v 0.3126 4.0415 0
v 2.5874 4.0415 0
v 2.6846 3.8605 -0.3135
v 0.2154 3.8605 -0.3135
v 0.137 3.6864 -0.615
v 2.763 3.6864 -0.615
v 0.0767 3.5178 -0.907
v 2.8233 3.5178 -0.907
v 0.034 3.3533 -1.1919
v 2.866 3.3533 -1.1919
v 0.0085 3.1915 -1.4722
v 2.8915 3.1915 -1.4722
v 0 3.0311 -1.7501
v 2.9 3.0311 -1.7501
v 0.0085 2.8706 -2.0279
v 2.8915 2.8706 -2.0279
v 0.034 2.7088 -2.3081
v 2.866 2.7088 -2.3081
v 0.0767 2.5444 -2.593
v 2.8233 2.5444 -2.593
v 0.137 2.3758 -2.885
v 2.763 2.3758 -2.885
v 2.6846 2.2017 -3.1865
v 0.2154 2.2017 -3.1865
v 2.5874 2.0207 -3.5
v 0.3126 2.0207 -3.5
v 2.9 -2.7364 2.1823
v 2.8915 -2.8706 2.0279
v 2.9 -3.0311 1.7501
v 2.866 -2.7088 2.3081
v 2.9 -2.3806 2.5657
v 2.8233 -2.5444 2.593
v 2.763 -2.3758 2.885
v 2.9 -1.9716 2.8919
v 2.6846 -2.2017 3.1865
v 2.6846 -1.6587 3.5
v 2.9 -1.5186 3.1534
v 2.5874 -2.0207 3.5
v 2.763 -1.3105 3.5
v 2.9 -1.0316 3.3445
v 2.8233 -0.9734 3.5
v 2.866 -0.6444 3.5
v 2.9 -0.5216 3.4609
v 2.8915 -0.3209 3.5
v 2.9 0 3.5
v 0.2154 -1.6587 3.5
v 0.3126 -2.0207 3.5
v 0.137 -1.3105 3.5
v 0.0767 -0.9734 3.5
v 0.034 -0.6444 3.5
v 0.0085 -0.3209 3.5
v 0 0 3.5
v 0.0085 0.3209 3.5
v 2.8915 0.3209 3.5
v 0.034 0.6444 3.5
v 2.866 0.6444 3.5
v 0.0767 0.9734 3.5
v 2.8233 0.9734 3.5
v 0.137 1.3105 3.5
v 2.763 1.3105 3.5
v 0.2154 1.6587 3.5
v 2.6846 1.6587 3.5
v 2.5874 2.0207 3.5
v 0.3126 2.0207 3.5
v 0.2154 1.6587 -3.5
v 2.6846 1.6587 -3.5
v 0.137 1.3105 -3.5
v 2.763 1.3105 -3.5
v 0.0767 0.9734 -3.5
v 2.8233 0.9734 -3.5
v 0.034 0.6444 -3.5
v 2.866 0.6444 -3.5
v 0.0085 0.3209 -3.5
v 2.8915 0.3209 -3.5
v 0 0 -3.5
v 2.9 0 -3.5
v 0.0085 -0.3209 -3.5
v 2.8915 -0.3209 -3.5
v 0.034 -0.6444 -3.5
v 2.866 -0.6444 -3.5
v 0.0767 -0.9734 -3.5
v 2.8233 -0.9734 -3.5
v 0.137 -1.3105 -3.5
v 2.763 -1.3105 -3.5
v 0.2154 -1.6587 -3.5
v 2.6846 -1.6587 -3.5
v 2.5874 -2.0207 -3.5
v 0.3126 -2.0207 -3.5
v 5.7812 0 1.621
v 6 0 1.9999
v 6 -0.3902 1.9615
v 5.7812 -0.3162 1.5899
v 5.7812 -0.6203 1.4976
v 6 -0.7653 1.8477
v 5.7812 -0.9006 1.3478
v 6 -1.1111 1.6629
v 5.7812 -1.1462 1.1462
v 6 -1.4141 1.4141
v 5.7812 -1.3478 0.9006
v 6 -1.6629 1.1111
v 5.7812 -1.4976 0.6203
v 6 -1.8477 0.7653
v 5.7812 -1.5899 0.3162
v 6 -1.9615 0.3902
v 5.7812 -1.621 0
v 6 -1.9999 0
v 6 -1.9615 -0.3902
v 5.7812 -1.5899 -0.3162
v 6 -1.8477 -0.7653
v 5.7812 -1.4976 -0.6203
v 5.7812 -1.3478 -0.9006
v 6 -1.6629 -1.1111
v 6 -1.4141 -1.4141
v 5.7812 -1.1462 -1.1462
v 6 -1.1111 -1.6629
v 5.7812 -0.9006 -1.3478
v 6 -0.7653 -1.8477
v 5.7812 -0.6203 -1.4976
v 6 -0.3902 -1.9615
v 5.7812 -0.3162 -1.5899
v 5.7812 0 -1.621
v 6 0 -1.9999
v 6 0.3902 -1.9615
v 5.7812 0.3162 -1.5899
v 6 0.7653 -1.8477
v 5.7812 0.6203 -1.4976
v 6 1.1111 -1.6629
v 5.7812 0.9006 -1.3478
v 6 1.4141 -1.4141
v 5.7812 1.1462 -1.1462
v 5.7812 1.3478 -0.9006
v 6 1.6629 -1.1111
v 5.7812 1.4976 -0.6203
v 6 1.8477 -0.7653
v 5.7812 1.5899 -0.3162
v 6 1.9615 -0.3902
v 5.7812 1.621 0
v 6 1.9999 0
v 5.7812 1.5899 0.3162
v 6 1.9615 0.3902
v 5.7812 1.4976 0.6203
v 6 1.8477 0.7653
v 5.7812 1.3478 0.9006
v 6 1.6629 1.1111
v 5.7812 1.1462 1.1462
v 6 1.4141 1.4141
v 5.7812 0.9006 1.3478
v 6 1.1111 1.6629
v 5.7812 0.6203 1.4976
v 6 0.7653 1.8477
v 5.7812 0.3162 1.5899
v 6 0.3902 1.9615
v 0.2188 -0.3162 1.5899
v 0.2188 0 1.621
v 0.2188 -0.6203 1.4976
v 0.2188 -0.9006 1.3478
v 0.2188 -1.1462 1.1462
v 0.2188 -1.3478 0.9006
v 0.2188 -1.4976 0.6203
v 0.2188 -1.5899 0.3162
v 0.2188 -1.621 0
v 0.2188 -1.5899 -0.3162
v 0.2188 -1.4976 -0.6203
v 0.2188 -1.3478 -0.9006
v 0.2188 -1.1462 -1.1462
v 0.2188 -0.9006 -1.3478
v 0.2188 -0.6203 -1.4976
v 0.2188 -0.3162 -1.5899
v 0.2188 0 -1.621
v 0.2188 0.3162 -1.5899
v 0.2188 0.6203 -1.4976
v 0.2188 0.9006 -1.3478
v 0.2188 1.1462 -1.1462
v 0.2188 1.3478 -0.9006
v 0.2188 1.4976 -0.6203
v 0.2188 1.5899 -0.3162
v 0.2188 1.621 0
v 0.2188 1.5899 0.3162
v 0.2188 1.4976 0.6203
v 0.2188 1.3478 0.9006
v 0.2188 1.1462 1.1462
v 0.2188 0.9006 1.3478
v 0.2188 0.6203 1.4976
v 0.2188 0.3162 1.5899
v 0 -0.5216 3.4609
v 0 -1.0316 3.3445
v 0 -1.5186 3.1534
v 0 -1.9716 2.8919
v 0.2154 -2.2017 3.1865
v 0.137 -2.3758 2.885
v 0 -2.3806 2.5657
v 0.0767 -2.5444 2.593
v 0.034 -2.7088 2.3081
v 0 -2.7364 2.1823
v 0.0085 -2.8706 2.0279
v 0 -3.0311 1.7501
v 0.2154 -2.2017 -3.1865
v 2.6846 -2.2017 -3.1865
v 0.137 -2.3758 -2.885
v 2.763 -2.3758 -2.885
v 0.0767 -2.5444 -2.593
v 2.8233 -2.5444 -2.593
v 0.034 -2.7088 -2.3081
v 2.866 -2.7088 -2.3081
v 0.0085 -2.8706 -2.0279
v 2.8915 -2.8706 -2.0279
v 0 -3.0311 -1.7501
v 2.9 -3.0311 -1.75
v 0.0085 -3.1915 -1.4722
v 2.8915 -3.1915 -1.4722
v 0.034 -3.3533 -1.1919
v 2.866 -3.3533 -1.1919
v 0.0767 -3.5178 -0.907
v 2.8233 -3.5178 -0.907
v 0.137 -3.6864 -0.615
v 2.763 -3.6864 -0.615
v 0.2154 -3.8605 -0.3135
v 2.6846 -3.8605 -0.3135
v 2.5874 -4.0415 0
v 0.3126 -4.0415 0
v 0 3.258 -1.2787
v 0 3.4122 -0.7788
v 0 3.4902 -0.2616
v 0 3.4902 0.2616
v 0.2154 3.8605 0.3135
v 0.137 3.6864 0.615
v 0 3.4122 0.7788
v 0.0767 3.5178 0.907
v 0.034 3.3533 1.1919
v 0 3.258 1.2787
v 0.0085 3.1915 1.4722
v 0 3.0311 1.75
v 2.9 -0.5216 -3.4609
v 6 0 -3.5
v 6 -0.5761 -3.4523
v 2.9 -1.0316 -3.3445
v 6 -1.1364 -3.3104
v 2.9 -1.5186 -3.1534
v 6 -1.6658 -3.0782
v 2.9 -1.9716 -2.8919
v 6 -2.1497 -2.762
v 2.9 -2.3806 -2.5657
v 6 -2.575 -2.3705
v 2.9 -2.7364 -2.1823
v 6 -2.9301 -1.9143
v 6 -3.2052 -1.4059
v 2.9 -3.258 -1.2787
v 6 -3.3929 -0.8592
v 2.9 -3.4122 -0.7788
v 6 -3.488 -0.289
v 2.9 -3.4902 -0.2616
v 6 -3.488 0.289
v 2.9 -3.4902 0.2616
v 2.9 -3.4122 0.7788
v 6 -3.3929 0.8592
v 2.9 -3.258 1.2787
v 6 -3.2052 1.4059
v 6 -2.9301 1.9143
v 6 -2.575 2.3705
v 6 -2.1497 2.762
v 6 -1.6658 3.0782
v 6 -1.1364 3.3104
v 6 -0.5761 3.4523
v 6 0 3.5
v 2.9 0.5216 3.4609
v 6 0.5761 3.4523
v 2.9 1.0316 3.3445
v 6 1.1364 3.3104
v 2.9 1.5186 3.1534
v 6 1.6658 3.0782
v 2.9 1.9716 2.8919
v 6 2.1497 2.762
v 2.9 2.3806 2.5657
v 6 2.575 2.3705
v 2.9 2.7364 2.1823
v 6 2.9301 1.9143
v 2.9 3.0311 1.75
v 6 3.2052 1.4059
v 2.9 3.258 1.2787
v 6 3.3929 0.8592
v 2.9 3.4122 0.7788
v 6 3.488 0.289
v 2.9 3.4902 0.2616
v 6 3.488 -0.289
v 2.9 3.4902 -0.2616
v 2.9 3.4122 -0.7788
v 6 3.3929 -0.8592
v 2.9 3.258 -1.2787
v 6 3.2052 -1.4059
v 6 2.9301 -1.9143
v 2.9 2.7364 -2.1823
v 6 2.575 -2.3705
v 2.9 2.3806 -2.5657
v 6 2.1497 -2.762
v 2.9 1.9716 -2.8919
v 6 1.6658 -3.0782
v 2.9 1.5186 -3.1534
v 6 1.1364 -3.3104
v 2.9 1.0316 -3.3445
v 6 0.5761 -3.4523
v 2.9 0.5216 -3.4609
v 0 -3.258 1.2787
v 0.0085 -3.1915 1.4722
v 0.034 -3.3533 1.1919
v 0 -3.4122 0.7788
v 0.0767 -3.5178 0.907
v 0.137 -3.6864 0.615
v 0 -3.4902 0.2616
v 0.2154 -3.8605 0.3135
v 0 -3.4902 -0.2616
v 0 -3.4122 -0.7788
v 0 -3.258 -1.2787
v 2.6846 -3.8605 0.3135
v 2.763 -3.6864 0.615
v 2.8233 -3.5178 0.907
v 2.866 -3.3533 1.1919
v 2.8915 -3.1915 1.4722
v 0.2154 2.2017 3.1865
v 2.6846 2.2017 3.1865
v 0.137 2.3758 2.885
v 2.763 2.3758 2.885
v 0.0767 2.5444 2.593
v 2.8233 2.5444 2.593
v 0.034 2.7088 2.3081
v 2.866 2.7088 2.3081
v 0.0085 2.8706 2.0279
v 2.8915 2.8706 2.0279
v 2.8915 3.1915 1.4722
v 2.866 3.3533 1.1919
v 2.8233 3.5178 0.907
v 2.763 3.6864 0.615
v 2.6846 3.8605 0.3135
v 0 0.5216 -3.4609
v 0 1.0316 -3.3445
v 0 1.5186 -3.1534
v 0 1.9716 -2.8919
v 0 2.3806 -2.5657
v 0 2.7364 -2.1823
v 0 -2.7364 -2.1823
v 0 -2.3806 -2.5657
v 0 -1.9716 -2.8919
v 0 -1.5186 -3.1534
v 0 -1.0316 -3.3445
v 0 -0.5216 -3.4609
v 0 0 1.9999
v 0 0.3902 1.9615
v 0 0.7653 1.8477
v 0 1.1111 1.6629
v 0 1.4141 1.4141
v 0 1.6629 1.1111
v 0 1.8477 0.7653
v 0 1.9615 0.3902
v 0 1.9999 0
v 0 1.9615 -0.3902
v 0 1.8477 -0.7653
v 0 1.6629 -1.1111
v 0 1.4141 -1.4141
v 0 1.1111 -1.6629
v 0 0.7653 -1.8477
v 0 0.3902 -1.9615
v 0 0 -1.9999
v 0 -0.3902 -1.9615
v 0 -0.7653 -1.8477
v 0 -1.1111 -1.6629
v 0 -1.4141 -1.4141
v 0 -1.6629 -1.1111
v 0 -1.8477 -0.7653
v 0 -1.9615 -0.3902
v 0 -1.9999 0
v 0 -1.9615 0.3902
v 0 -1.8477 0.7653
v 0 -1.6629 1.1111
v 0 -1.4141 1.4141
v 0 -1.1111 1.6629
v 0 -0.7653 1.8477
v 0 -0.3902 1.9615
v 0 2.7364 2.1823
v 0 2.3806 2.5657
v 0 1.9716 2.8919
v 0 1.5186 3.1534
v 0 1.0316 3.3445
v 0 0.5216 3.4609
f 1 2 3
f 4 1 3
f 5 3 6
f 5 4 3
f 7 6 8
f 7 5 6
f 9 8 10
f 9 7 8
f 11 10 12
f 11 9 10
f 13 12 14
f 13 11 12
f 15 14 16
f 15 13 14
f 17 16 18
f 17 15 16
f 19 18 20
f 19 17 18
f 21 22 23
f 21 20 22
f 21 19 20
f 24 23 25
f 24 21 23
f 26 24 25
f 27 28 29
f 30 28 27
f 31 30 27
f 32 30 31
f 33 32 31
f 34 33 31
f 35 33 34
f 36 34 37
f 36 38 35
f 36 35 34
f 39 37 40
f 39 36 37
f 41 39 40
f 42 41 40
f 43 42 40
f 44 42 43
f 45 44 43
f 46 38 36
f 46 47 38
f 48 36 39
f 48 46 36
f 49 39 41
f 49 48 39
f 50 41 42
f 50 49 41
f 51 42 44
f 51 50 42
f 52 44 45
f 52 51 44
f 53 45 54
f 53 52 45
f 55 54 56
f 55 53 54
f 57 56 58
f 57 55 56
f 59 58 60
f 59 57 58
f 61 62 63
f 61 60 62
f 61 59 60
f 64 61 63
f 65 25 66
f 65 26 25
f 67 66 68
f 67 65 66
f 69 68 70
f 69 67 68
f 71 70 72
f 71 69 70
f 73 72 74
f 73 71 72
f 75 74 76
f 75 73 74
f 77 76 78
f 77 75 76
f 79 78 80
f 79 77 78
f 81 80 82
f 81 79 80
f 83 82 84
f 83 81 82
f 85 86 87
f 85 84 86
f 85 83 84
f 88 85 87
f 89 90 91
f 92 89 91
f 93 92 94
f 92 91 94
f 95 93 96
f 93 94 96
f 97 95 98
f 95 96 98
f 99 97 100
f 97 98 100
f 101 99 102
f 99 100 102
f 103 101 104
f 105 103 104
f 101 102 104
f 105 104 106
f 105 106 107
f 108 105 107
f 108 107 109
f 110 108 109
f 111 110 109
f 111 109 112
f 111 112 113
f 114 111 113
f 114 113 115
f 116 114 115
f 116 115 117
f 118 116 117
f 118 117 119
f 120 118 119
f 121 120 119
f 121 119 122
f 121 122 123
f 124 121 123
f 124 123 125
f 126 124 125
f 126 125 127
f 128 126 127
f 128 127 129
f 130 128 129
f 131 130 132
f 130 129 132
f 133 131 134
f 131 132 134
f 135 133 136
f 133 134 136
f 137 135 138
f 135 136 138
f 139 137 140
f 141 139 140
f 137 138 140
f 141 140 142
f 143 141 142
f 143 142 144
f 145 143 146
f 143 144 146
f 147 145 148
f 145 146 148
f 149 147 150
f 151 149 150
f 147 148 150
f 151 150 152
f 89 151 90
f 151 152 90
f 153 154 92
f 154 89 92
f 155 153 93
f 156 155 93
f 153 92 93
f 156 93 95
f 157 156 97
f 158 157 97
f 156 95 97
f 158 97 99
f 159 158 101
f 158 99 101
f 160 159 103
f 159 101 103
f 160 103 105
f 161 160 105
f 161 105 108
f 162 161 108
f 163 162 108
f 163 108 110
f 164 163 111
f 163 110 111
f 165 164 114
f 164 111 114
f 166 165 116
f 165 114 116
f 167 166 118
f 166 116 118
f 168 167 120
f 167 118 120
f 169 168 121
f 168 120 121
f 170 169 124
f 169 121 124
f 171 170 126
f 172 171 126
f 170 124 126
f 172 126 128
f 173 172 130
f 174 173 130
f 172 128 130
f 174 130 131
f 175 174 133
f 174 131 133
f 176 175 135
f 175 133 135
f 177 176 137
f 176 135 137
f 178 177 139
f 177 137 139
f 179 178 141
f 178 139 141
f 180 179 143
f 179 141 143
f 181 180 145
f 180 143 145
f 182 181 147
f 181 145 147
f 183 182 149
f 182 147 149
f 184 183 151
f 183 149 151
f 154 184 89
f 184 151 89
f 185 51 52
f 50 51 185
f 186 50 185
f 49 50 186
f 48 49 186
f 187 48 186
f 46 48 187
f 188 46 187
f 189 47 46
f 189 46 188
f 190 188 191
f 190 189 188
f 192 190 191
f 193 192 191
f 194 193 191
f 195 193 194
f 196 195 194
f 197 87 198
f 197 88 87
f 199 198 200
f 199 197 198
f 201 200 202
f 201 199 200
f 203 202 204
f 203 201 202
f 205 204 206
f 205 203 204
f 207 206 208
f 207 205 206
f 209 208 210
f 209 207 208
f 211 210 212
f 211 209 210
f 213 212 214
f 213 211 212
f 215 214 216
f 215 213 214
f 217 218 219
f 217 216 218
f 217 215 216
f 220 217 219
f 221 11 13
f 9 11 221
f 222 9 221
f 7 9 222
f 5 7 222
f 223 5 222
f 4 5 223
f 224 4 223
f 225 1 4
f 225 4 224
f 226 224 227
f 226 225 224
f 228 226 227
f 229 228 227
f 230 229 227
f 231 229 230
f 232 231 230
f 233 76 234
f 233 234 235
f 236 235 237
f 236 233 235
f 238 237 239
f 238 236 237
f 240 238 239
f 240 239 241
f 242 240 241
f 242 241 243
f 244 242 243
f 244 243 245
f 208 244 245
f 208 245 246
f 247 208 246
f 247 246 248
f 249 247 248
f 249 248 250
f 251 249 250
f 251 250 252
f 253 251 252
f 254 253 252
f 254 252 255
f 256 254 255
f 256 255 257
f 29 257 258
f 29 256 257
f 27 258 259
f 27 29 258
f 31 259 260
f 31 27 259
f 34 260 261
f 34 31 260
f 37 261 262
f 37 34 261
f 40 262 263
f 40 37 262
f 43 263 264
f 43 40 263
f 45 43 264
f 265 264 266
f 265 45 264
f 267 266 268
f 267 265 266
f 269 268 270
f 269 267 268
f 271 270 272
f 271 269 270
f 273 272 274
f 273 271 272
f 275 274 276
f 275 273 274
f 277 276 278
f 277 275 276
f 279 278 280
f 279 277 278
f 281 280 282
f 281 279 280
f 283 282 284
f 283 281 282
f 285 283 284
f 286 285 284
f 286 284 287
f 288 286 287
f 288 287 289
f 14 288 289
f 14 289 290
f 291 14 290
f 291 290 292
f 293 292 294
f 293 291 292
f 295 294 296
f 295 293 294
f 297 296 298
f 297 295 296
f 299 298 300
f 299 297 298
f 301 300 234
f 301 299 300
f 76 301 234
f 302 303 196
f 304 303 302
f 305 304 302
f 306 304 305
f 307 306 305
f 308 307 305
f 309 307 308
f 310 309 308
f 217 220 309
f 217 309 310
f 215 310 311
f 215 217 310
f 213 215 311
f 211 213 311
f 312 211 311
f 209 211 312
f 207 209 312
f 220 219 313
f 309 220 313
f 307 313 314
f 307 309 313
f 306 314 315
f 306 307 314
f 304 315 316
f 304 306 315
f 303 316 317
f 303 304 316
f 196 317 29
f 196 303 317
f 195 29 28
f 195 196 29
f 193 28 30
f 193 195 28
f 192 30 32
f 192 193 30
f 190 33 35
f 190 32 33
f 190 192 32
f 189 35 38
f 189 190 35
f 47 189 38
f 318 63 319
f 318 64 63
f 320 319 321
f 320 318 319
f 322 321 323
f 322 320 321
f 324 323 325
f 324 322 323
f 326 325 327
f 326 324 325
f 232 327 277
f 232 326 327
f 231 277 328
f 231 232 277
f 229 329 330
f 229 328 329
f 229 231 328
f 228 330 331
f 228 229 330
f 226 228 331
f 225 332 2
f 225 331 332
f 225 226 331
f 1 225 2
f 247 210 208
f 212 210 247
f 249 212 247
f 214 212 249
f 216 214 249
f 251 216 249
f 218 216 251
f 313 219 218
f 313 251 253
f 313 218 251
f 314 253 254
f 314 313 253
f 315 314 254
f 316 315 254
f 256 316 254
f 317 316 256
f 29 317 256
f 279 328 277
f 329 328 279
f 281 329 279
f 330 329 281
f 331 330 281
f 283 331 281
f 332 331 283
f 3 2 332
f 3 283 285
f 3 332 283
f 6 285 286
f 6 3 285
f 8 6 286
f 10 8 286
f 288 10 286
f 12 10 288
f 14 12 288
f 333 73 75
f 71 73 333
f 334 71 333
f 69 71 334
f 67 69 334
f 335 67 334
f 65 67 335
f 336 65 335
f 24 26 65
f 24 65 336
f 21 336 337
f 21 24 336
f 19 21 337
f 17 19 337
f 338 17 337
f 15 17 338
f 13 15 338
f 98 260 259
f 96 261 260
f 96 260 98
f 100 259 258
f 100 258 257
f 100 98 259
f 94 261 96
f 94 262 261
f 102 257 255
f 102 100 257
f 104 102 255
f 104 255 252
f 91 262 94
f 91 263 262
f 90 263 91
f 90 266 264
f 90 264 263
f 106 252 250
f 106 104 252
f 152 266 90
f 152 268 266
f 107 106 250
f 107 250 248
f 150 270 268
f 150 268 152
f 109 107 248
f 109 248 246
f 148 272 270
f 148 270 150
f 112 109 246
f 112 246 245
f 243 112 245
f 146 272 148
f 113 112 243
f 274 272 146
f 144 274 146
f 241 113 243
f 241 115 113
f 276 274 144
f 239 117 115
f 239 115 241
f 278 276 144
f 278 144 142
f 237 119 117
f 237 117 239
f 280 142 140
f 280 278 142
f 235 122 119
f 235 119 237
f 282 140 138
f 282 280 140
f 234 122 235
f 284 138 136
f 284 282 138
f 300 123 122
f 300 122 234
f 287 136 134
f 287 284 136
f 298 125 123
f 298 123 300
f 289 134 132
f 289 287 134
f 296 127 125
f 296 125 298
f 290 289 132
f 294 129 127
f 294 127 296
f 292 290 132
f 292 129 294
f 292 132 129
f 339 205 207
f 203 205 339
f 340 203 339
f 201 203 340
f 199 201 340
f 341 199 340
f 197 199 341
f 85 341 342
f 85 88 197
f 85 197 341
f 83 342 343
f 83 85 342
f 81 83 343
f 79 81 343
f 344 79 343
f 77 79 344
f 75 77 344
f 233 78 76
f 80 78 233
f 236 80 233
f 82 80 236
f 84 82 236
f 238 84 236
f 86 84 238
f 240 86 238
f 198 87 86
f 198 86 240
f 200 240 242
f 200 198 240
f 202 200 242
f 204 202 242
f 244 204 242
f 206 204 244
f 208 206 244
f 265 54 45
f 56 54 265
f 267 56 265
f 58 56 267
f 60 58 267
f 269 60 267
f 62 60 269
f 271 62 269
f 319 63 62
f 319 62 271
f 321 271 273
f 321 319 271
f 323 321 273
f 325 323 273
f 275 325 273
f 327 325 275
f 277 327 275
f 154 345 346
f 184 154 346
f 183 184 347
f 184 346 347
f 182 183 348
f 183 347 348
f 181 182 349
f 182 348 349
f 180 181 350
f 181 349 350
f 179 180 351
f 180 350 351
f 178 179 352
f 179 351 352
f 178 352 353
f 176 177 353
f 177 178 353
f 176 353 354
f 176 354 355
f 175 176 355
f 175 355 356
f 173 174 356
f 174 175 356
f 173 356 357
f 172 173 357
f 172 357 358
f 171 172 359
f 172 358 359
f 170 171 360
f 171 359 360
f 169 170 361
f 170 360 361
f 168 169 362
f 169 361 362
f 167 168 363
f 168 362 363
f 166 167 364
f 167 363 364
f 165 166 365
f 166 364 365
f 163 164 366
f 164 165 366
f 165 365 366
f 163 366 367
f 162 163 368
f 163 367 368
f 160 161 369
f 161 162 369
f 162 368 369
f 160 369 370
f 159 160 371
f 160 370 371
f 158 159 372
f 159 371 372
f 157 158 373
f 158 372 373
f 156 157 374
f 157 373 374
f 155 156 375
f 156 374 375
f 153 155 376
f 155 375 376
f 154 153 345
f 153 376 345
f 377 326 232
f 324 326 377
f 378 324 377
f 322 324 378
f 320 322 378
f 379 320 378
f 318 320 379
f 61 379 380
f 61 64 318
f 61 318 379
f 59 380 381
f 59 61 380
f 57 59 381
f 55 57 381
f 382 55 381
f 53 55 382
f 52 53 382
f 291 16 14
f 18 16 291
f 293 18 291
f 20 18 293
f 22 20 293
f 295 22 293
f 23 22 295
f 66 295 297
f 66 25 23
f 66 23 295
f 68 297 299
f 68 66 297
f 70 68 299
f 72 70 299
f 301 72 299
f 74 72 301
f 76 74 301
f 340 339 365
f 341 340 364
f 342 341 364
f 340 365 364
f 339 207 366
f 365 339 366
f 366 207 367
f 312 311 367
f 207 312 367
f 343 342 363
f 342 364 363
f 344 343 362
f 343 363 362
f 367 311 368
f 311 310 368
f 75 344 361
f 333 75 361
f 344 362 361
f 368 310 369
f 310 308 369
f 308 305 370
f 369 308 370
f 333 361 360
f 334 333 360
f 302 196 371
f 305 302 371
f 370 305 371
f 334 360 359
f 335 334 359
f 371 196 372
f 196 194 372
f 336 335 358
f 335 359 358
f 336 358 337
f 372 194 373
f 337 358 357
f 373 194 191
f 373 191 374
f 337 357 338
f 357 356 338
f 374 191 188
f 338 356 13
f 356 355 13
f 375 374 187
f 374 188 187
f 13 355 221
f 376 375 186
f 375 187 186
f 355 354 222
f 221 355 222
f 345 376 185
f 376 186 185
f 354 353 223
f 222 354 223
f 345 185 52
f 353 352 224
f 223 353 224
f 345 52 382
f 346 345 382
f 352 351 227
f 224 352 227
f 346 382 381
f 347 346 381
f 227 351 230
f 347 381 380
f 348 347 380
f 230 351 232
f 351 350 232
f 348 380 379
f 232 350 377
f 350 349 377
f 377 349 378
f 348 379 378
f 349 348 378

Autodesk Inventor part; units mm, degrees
ref_plane "YZ Plane" through (0, 0, 0) normal (1, 0, 0) x (0, 1, 0)
ref_plane "XZ Plane" through (0, 0, 0) normal (0, 1, 0) x (-1, 0, 0)
sketch "Sketch1" plane through (0, 0, 0) normal (1, 0, 0) x (0, 1, 0)
  line L0 (2.0207, -3.5) -> (-2.0207, -3.5)
  line L1 (-2.0207, -3.5) -> (-4.0415, 0)
  line L2 (-4.0415, 0) -> (-2.0207, 3.5)
  line L3 (-2.0207, 3.5) -> (2.0207, 3.5)
  line L4 (2.0207, 3.5) -> (4.0415, 0)
  line L5 (4.0415, 0) -> (2.0207, -3.5)
  point P0 (0, 0)
  point P1 (0, 0)
  dimension "d0" = 8.0829
extrude "Body" add sketch "Sketch1" along normal blind 2.9
sketch "Sketch2" plane through (2.9, 0, 0) normal (1, 0, 0) x (0, 0, -1)
  circle A0 centre (0, 0) radius 3.5
  dimension "d7" = 7
extrude "Ring" add sketch "Sketch2" along normal blind 3.1
sketch "Sketch3" plane through (0, 0, 0) normal (0, 0, 1) x (1, 0, 0)
  line L0 (0, 2.0207) -> (0, 4.0415) projected
  line L1 (0, 4.0415) -> (2.9, 4.0415) projected
  line L2 (2.9, 2.0207) -> (2.9, 4.0415) projected
  line L3 (-0.58, 0) -> (3.48, 0) projected
  line L4 (0, 3.5) -> (0.3126, 4.0415)
  line L5 (2.5874, 4.0415) -> (2.9, 3.5)
  dimension "d3" = 30
  dimension "d4" = 30
  dimension "d5" = 7
  dimension "d6" = 7
revolve "Chamfer1" cut sketch "Sketch3" angle 360 about axis through (-10, 0, 0) along (1, 0, 0)
sketch "Sketch4" plane through (0, 0, 0) normal (-1, 0, 0) x (0, 0, 1)
  line L0 (0, -5.658) -> (0, 5.658) projected
  line L1 (-4.9, 0) -> (4.9, 0) projected
  point P0 (0, 0)
hole "Thread" at (0, 0, 0) direction (1, 0, 0) diameter 3.242 end through all thread size "M4x0.7" class "6H" standard "ISO Metric profile"
chamfer "Chamfer2" distance 0.3789 angle 30 1 edges at (0, 0, -1.621) measured on face at (0, 2.8569, 0.0651)
chamfer "Chamfer3" distance 0.3789 angle 30 1 edges at (6, 0, -1.621) measured on face at (6, -0.4085, -2.8241)
ref_plane "Work Plane1" through (12.261, 0, 0) normal (0, 0, 1) x (-1, 0, 0)
equation "\"d0\" = 1.1547 * SW"
equation "\"d1\" = KOH1"
equation "\"d7\" = SD2"
equation "\"d8\" = KOH - KOH1"
equation "\"d3\" = ANG1"
equation "\"d4\" = ANG2"
equation "\"d5\" = SW0"
equation "\"d6\" = SW01"
equation "\"d10\" = -0.5 * GD1 + 0.5 * NND"
equation "\"d46\" = -0.5 * GD1 + 0.5 * NND"
equation "\"d12\" = -0.5 * GD1 + 0.5 * NND"
equation "\"d47\" = -0.5 * GD1 + 0.5 * NND"
equation "\"ANG1\" = 30deg"
equation "\"ANG2\" = ANG1"
equation "\"NND\" = 4"
equation "\"KOH1\" = 2.9"
equation "\"KOH\" = 6"
equation "\"SW\" = 7"
equation "\"SW0\" = SW"
equation "\"SW01\" = SW"
equation "\"SD2\" = SW"
equation "\"GUL\" = 0.541266 * PTC"
equation "\"THREADDIA\" = 4"
equation "\"TOA\" = 30deg"
equation "\"PTC\" = 0.7"
equation "\"E0\" = 1.155 * SW"
equation "\"GAL\" = 0.541266 * PTC"
equation "\"GD1\" = 3.242228"
properties part number "NF E 25-409 - M4" material "Steel, Mild"
